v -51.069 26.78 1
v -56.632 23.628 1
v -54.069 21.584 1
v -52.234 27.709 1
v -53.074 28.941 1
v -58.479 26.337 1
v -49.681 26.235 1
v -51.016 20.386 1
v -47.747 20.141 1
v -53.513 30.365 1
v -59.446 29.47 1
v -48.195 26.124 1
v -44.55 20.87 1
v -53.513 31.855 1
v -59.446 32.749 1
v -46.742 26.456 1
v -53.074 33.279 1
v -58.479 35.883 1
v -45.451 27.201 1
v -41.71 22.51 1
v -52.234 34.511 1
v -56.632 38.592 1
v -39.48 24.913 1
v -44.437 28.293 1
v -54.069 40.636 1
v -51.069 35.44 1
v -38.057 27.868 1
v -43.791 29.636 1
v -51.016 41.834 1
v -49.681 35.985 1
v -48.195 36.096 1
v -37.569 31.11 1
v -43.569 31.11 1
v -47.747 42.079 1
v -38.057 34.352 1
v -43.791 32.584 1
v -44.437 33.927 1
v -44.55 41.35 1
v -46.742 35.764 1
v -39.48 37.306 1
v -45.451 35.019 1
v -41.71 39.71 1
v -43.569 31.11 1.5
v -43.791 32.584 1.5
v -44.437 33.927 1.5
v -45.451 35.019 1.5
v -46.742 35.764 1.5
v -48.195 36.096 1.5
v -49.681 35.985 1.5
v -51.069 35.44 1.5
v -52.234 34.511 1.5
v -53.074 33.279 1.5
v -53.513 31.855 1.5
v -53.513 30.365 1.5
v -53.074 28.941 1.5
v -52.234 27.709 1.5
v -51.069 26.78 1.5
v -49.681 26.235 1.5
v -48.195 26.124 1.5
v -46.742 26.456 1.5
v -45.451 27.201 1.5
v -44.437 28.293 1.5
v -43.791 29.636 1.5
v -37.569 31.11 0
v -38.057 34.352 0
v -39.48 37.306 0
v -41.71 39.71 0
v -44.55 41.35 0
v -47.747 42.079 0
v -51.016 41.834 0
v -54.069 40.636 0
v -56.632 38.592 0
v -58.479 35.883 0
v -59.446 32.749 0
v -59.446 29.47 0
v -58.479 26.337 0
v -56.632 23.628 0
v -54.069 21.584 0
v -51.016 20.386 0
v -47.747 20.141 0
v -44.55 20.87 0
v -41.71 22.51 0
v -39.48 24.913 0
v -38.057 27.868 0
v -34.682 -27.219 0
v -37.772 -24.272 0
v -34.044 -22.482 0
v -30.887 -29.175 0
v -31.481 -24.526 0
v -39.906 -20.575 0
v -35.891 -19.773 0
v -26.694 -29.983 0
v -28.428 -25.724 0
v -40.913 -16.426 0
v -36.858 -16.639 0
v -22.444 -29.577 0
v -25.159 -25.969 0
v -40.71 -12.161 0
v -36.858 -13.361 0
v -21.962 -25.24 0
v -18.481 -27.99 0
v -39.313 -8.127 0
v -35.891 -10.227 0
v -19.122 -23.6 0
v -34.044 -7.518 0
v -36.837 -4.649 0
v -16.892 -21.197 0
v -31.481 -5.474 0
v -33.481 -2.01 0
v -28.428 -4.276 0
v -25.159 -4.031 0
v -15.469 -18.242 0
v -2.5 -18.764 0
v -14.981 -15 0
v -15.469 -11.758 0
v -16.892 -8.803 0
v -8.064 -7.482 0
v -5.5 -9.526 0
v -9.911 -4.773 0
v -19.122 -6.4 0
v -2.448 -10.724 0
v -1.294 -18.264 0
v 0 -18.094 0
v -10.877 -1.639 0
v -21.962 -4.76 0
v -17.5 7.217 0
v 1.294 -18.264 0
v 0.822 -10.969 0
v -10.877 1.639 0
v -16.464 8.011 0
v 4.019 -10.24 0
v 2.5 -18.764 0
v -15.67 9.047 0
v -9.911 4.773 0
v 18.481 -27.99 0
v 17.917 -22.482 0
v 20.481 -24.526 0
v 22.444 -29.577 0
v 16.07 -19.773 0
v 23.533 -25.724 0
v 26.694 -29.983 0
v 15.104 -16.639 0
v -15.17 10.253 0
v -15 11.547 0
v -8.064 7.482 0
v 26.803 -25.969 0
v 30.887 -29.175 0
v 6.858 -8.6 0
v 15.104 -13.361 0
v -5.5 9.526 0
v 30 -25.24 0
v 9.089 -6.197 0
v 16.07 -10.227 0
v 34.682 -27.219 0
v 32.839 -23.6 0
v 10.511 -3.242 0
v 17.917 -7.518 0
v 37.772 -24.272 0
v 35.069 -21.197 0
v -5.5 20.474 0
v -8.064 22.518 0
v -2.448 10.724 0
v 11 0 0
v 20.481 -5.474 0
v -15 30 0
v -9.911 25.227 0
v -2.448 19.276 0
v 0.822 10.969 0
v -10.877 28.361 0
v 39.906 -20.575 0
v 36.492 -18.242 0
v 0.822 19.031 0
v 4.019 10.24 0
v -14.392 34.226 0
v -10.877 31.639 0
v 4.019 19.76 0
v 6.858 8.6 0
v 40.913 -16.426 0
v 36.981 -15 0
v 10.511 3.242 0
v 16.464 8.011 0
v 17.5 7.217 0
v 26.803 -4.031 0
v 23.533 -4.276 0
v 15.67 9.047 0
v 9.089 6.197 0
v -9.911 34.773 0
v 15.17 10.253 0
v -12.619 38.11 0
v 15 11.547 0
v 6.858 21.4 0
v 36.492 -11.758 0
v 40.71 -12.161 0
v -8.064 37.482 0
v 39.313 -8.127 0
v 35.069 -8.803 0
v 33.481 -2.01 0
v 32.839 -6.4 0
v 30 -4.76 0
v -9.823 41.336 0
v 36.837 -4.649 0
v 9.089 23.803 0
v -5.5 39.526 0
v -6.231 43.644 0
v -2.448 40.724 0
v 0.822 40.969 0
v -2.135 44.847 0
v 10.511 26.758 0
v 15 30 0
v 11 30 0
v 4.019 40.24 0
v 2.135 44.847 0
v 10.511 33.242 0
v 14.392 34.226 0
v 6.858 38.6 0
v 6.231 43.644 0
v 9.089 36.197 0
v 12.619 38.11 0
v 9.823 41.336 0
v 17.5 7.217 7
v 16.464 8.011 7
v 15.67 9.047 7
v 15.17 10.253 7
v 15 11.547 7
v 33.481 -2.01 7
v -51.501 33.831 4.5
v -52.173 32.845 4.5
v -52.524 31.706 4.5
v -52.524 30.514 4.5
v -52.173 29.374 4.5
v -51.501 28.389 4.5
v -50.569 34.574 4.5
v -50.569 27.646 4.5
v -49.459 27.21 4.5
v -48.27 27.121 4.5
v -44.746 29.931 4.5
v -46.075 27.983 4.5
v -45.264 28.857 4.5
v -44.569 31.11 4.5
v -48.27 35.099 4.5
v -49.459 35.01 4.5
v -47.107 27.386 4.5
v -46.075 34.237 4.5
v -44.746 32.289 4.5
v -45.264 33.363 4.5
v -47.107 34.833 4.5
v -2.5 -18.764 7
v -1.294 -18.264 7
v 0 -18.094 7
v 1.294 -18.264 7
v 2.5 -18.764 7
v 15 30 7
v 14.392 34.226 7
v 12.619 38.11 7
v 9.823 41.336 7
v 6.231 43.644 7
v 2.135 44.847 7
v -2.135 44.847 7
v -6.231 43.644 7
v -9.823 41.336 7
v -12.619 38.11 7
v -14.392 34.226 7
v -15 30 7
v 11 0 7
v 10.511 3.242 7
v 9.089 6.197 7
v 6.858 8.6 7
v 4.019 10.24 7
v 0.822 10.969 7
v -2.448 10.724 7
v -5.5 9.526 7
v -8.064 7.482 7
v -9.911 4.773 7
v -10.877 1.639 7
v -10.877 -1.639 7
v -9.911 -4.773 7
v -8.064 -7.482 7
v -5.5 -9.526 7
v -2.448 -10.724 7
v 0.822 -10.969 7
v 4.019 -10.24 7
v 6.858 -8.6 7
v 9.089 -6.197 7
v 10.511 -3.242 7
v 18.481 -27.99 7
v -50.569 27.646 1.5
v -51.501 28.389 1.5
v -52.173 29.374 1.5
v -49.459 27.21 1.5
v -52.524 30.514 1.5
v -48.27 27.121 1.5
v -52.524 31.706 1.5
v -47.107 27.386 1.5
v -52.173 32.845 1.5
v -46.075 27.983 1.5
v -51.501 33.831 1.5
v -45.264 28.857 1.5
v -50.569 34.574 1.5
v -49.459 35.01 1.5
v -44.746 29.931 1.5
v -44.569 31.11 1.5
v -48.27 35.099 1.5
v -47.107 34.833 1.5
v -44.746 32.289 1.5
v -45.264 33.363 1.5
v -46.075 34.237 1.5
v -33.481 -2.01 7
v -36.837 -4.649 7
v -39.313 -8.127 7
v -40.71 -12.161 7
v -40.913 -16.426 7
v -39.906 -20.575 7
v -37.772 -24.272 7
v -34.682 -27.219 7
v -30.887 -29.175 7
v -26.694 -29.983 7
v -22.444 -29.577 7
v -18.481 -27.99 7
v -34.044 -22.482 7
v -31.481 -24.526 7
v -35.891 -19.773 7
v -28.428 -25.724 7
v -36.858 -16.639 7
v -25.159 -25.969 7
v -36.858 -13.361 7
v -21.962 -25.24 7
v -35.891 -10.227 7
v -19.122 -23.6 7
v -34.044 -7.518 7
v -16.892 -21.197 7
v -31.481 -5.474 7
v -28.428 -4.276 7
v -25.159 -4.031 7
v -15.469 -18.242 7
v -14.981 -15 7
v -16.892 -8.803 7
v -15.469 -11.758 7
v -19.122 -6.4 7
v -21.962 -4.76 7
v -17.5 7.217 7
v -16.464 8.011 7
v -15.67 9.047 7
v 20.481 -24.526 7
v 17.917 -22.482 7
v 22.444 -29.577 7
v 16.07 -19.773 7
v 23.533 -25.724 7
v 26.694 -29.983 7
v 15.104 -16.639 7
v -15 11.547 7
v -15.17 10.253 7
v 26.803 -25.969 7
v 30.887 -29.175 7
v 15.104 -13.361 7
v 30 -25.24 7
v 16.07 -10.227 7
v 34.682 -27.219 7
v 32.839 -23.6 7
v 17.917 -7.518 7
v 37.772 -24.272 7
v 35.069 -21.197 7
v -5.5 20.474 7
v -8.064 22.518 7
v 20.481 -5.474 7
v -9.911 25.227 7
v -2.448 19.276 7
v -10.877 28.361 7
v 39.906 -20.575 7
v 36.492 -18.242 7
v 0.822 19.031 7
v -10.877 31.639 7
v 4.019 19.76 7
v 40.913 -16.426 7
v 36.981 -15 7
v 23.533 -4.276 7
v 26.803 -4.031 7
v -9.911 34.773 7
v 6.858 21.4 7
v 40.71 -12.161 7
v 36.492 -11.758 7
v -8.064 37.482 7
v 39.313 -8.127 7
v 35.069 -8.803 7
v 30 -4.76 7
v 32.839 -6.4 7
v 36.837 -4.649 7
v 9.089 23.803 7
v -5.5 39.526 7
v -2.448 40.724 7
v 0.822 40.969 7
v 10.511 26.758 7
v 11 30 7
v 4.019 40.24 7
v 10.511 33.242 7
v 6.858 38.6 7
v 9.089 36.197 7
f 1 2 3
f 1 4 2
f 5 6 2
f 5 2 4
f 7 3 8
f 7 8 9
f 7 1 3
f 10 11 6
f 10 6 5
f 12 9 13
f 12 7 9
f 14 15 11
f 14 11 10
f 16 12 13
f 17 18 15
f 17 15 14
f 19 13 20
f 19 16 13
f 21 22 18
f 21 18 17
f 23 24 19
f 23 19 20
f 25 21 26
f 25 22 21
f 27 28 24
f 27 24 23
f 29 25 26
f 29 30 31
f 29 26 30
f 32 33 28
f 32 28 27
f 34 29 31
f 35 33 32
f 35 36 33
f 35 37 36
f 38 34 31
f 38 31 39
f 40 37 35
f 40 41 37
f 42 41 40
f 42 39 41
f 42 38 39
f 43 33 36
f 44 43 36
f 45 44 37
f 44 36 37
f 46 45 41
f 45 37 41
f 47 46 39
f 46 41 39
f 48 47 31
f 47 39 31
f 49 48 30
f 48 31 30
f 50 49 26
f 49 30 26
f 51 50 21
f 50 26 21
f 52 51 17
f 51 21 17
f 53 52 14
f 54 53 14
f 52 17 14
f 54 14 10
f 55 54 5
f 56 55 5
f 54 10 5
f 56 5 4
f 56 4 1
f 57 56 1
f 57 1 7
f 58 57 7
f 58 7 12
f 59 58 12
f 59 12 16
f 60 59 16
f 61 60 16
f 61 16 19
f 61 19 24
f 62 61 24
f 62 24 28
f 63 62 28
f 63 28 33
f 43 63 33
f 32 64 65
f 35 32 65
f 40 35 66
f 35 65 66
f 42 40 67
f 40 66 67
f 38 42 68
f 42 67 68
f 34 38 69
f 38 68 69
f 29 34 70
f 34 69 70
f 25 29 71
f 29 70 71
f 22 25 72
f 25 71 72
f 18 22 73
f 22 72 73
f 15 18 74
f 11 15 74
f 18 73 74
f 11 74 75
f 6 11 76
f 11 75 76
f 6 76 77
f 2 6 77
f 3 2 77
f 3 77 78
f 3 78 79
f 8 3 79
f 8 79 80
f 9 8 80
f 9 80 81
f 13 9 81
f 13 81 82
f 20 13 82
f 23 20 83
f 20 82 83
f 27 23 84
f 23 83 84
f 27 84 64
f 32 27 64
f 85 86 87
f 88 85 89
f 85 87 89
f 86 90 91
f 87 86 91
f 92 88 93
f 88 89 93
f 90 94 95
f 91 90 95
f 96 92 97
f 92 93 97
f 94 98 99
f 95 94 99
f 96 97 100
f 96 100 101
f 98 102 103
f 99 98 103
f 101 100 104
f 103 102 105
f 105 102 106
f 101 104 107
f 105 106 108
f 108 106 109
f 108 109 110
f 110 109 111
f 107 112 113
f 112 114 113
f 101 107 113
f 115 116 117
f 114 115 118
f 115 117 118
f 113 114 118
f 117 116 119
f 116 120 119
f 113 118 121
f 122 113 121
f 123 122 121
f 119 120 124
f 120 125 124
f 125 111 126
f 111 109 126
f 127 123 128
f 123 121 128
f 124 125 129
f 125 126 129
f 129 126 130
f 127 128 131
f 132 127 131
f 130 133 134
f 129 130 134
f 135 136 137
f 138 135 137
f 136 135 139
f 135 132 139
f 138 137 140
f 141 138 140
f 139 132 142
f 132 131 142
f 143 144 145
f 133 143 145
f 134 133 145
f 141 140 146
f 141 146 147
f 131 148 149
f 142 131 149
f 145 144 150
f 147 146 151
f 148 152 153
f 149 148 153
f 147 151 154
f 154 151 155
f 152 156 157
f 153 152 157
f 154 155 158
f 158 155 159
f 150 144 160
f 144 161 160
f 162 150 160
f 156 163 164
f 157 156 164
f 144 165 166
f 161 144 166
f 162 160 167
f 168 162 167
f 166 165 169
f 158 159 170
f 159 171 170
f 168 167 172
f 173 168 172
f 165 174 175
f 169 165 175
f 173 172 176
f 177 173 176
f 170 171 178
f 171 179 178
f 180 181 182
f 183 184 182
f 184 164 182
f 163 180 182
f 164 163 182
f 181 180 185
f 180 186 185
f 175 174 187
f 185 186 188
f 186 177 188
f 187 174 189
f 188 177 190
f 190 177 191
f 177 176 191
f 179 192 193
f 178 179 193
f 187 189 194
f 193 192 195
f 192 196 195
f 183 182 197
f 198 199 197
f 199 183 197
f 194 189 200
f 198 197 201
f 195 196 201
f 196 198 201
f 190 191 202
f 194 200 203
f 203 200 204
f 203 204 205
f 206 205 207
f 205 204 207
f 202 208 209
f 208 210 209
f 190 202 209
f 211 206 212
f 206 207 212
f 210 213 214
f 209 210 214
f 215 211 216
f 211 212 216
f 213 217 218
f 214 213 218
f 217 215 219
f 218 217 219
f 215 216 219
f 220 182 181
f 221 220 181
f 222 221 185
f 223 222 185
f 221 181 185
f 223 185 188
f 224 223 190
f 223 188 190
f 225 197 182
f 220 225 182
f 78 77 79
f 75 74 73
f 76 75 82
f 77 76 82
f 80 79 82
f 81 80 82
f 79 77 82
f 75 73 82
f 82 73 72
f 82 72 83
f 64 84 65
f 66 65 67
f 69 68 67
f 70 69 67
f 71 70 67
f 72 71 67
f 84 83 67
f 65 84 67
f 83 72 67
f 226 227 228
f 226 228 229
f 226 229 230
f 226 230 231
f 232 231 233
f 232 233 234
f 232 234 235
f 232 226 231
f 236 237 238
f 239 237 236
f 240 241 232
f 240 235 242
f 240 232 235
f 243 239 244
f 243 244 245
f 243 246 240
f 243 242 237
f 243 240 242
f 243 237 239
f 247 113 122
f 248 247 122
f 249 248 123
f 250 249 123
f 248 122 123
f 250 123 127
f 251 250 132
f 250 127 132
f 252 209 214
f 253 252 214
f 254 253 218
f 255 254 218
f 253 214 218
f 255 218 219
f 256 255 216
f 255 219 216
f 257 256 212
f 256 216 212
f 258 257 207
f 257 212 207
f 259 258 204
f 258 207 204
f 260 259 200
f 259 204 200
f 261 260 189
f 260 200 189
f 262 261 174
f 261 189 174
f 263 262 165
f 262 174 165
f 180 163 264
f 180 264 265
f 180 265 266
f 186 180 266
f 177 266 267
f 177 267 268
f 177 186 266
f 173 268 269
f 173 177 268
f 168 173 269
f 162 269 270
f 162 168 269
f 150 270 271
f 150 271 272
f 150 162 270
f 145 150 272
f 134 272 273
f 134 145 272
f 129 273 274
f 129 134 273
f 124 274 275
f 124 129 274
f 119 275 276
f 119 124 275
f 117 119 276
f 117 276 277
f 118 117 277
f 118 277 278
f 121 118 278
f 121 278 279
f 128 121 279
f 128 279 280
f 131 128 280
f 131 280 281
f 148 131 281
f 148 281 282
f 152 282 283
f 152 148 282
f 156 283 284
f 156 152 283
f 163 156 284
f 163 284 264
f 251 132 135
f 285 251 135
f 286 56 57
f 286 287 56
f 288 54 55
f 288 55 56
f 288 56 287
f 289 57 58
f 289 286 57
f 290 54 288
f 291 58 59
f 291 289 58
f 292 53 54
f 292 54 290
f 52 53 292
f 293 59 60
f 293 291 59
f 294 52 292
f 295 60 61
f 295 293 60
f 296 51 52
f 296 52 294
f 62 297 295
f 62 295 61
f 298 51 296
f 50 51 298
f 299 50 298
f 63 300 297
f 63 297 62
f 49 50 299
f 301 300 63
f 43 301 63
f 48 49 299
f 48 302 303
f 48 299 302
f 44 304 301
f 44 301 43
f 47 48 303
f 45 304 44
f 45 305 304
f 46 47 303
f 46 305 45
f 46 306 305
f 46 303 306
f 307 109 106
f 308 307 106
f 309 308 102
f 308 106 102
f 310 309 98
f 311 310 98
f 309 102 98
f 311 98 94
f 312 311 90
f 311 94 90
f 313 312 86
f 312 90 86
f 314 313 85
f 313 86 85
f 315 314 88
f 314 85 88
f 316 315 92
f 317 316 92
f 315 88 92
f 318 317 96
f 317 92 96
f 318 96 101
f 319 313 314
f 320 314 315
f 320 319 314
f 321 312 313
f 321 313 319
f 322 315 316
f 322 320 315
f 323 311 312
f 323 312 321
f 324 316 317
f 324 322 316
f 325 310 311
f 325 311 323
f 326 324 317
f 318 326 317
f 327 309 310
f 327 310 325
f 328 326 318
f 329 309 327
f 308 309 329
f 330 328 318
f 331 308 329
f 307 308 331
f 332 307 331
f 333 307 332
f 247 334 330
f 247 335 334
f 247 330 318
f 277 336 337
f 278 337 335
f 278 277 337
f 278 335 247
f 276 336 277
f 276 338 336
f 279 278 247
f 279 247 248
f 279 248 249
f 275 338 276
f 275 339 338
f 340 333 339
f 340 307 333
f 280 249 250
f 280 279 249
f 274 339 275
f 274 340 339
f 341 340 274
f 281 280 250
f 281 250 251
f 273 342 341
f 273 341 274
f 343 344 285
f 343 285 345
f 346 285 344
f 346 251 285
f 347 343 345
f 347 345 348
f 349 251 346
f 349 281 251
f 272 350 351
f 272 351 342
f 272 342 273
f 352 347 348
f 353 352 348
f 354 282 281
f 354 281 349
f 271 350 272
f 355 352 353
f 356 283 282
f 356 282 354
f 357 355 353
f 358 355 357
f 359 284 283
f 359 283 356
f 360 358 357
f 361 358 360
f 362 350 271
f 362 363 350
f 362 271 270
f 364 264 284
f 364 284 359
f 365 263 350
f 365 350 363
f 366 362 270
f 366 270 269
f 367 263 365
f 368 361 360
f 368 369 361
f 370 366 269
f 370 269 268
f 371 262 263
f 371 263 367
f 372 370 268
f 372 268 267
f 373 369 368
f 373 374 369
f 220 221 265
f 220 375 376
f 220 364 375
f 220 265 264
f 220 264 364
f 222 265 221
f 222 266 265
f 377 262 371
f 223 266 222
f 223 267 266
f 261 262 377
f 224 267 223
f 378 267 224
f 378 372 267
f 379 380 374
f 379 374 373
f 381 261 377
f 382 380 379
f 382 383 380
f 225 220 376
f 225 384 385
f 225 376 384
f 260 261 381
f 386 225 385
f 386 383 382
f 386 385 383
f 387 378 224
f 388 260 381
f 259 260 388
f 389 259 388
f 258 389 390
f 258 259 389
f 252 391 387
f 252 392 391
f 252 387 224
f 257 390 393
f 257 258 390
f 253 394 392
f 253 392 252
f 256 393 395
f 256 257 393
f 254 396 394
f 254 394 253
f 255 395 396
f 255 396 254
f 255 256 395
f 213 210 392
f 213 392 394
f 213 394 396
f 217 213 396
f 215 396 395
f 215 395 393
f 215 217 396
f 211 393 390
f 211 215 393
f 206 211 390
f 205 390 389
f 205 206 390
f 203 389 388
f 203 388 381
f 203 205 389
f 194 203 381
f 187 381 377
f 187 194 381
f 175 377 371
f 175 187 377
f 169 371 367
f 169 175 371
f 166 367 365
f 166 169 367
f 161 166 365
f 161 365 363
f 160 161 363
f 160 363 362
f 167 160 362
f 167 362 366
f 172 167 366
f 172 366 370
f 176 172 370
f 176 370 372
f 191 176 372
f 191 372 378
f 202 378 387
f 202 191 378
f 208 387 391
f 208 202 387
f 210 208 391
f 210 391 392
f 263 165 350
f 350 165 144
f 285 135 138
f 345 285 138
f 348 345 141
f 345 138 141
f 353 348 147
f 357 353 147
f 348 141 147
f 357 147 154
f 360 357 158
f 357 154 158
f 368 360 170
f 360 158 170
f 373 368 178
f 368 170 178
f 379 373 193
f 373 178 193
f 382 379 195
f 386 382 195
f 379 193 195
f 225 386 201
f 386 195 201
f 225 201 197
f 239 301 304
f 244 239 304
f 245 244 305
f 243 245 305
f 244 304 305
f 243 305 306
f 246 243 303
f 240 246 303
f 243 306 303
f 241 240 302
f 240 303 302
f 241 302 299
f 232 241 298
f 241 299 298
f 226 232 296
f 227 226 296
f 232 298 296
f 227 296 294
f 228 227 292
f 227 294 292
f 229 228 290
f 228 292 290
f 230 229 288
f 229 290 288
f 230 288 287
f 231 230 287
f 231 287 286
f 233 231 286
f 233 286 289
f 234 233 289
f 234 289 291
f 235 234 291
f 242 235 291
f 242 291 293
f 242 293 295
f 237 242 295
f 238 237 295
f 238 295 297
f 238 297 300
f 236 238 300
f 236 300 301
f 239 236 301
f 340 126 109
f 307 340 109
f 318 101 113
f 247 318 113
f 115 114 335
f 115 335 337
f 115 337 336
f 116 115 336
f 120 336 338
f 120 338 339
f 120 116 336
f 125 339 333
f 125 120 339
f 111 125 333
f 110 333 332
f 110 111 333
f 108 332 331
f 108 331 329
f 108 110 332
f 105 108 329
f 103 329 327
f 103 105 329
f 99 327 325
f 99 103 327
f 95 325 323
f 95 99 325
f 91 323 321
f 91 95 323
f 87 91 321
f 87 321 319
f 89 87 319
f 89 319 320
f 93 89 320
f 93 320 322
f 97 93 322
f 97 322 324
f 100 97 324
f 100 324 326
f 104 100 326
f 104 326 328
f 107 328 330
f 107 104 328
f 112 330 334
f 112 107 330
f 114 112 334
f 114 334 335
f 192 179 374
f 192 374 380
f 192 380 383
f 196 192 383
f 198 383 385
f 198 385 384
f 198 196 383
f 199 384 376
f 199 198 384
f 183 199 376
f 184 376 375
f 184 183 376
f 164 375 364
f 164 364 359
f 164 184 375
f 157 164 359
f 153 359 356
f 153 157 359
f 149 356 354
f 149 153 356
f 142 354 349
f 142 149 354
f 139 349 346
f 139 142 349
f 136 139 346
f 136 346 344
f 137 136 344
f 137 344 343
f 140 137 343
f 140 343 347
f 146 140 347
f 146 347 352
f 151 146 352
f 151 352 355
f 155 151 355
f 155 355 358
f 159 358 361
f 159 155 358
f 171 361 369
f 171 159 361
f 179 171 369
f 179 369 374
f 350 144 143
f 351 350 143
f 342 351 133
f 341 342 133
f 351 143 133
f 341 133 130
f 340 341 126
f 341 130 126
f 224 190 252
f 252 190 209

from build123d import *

# Parameters (mm, degrees)
F0_R     = 11
F0_R_2   = 15
F1_DEPTH = 7
F0_R_3   = 4
F2_DEPTH = 4.5
F0_R_4   = 5
F3_DEPTH = 1.5
F4_DEPTH = 1


with BuildPart() as f1:
    # F0 (on Top) → F1 (new body)
    with BuildSketch(Plane.XY):
        with BuildLine():
            Line((15, 11.547005), (15, 30))
            ThreePointArc((15, 30), (0, 45), (-15, 30))
            Line((-15, 30), (-15, 11.547005))
            ThreePointArc((-15, 11.547005), (-15.669873, 9.047005), (-17.5, 7.216878))
            Line((-17.5, 7.216878), (-33.480762, -2.009619))
            ThreePointArc((-33.480762, -2.009619), (-38.971143, -22.5), (-18.480762, -27.990381))
            Line((-18.480762, -27.990381), (-2.5, -18.763884))
            ThreePointArc((-2.5, -18.763884), (0, -18.094011), (2.5, -18.763884))
            Line((2.5, -18.763884), (18.480762, -27.990381))
            ThreePointArc((18.480762, -27.990381), (38.971143, -22.5), (33.480762, -2.009619))
            Line((33.480762, -2.009619), (17.5, 7.216878))
            ThreePointArc((17.5, 7.216878), (15.669873, 9.047005), (15, 11.547005))
        make_face()
        with Locations((-25.980762, -15)):
            Circle(F0_R, mode=Mode.SUBTRACT)
        with Locations((25.980762, -15)):
            Circle(F0_R, mode=Mode.SUBTRACT)
        Circle(F0_R_2, mode=Mode.SUBTRACT)
        with Locations((0, 30)):
            Circle(F0_R, mode=Mode.SUBTRACT)
        Circle(F0_R_2)
        Circle(F0_R, mode=Mode.SUBTRACT)
    extrude(amount=F1_DEPTH)


with BuildPart() as f2:
    # F0 (on Top) → F2 (new body)
    with BuildSketch(Plane.XY):
        with Locations((-48.568692, 31.109964)):
            Circle(F0_R_3)
    extrude(amount=F2_DEPTH)

    # F0 (on Top) → F3 (join)
    with BuildSketch(Plane.XY):
        with Locations((-48.568692, 31.109964)):
            Circle(F0_R_4)
        with Locations((-48.568692, 31.109964)):
            Circle(F0_R_3, mode=Mode.SUBTRACT)
    extrude(amount=F3_DEPTH)

    # F0 (on Top) → F4 (join)
    with BuildSketch(Plane.XY):
        with Locations((-48.568692, 31.109964)):
            Circle(F0_R)
        with Locations((-48.568692, 31.109964)):
            Circle(F0_R_4, mode=Mode.SUBTRACT)
    extrude(amount=F4_DEPTH)


solid = Compound([f1.part, f2.part])
